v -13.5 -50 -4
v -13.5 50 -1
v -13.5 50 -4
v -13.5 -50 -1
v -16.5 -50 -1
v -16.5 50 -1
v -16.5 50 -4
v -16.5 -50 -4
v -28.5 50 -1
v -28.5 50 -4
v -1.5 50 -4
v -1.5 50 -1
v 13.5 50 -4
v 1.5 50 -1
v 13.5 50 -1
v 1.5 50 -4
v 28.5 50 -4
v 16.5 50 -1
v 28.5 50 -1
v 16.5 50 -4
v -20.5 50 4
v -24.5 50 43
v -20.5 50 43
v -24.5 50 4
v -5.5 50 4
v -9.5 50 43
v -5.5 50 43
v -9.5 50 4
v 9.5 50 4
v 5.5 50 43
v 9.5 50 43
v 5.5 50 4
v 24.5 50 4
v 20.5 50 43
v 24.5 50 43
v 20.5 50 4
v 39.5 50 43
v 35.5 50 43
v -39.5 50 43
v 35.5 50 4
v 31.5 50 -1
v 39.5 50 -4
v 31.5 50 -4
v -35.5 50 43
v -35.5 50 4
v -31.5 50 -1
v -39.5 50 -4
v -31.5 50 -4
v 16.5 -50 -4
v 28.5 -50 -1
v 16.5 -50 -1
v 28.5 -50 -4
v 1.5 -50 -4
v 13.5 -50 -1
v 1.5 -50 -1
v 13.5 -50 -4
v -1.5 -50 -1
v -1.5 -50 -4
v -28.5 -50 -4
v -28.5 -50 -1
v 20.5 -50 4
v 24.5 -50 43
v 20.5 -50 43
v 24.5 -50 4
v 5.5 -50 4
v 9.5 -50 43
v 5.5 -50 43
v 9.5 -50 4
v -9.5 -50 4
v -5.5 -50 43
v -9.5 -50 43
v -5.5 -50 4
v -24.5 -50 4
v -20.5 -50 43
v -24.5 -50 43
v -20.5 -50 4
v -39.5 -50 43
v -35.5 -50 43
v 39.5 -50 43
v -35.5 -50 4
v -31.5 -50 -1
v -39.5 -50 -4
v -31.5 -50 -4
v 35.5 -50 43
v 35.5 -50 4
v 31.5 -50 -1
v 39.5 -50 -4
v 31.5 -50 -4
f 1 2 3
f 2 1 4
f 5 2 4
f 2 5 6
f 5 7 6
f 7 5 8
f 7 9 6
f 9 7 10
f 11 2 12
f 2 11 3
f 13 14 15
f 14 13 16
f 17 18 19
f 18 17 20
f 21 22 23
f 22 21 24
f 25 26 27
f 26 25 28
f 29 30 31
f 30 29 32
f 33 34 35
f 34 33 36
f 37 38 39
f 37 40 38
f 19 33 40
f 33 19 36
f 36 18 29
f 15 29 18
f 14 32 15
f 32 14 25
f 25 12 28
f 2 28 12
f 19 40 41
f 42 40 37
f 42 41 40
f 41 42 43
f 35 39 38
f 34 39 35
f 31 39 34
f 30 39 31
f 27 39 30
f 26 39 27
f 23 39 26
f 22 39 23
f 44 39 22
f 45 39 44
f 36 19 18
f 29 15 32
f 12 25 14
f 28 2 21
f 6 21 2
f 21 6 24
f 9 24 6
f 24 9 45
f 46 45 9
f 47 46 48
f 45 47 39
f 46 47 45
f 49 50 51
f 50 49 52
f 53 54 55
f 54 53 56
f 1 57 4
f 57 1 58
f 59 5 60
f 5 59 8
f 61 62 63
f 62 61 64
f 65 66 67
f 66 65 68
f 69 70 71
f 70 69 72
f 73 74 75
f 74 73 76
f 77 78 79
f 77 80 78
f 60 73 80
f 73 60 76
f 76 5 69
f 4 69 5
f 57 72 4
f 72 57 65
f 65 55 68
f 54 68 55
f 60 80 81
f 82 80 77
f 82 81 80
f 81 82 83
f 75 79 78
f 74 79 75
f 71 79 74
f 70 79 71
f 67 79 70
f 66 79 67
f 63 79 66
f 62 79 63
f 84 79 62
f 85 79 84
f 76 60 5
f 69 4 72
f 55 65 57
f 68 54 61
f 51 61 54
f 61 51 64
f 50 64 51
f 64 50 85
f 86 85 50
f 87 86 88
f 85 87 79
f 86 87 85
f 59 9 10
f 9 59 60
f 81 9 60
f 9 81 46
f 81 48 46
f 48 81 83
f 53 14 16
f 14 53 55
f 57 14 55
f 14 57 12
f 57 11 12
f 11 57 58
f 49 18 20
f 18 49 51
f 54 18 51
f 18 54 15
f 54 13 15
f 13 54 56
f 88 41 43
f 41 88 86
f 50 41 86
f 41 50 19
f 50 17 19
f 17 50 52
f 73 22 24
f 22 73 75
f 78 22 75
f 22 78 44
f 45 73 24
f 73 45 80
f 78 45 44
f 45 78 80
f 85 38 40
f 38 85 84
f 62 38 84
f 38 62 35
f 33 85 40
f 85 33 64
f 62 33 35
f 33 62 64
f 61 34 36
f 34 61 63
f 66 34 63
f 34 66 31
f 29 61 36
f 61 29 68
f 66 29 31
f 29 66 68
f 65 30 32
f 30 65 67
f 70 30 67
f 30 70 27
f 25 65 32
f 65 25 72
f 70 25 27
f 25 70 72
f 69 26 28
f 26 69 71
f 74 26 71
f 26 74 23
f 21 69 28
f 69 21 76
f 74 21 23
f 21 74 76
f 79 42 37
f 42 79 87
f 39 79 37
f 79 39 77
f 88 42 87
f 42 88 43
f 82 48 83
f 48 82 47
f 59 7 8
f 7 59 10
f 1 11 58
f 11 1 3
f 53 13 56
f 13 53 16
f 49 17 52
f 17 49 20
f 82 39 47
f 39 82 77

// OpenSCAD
difference() {
  translate([0.0000000000, 0.0000000000, 19.5000086000]) {
    scale([79.0000000000, 100.0000000000, 47.0000000000]) {
      translate([-0.5000000000, -0.5000000000, -0.5000000000]) {
        cube([1, 1, 1]);
      }
    }
  }
  union() {
    union() {
      union() {
        union() {
          union() {
            union() {
              union() {
                union() {
                  union() {
                    translate([-15.0000000000, 0.0000000000, -2.5000000000]) {
                      scale([3.0000000000, 100.0000000000, 3.0000000000]) {
                        translate([-0.5000000000, -0.5000000000, -0.5000000000]) {
                          cube([1, 1, 1]);
                        }
                      }
                    }
                    translate([-30.0000000000, 0.0000000000, -2.5000000000]) {
                      scale([3.0000000000, 100.0000000000, 3.0000000000]) {
                        translate([-0.5000000000, -0.5000000000, -0.5000000000]) {
                          cube([1, 1, 1]);
                        }
                      }
                    }
                  }
                  translate([0.0000000000, 0.0000000000, -2.5000000000]) {
                    scale([3.0000000000, 100.0000000000, 3.0000000000]) {
                      translate([-0.5000000000, -0.5000000000, -0.5000000000]) {
                        cube([1, 1, 1]);
                      }
                    }
                  }
                }
                translate([15.0000000000, 0.0000000000, -2.5000000000]) {
                  scale([3.0000000000, 100.0000000000, 3.0000000000]) {
                    translate([-0.5000000000, -0.5000000000, -0.5000000000]) {
                      cube([1, 1, 1]);
                    }
                  }
                }
              }
              translate([30.0000000000, 0.0000000000, -2.5000000000]) {
                scale([3.0000000000, 100.0000000000, 3.0000000000]) {
                  translate([-0.5000000000, -0.5000000000, -0.5000000000]) {
                    cube([1, 1, 1]);
                  }
                }
              }
            }
            translate([-30.0000000000, 0.0000000000, 23.5000000000]) {
              scale([11.0000000000, 100.0000000000, 39.0000000000]) {
                translate([-0.5000000000, -0.5000000000, -0.5000000000]) {
                  cube([1, 1, 1]);
                }
              }
            }
          }
          translate([30.0000000000, 0.0000000000, 23.5000000000]) {
            scale([11.0000000000, 100.0000000000, 39.0000000000]) {
              translate([-0.5000000000, -0.5000000000, -0.5000000000]) {
                cube([1, 1, 1]);
              }
            }
          }
        }
        translate([15.0000000000, 0.0000000000, 23.5000000000]) {
          scale([11.0000000000, 100.0000000000, 39.0000000000]) {
            translate([-0.5000000000, -0.5000000000, -0.5000000000]) {
              cube([1, 1, 1]);
            }
          }
        }
      }
      translate([0.0000000000, 0.0000000000, 23.5000000000]) {
        scale([11.0000000000, 100.0000000000, 39.0000000000]) {
          translate([-0.5000000000, -0.5000000000, -0.5000000000]) {
            cube([1, 1, 1]);
          }
        }
      }
    }
    translate([-15.0000000000, 0.0000000000, 23.5000000000]) {
      scale([11.0000000000, 100.0000000000, 39.0000000000]) {
        translate([-0.5000000000, -0.5000000000, -0.5000000000]) {
          cube([1, 1, 1]);
        }
      }
    }
  }
}
